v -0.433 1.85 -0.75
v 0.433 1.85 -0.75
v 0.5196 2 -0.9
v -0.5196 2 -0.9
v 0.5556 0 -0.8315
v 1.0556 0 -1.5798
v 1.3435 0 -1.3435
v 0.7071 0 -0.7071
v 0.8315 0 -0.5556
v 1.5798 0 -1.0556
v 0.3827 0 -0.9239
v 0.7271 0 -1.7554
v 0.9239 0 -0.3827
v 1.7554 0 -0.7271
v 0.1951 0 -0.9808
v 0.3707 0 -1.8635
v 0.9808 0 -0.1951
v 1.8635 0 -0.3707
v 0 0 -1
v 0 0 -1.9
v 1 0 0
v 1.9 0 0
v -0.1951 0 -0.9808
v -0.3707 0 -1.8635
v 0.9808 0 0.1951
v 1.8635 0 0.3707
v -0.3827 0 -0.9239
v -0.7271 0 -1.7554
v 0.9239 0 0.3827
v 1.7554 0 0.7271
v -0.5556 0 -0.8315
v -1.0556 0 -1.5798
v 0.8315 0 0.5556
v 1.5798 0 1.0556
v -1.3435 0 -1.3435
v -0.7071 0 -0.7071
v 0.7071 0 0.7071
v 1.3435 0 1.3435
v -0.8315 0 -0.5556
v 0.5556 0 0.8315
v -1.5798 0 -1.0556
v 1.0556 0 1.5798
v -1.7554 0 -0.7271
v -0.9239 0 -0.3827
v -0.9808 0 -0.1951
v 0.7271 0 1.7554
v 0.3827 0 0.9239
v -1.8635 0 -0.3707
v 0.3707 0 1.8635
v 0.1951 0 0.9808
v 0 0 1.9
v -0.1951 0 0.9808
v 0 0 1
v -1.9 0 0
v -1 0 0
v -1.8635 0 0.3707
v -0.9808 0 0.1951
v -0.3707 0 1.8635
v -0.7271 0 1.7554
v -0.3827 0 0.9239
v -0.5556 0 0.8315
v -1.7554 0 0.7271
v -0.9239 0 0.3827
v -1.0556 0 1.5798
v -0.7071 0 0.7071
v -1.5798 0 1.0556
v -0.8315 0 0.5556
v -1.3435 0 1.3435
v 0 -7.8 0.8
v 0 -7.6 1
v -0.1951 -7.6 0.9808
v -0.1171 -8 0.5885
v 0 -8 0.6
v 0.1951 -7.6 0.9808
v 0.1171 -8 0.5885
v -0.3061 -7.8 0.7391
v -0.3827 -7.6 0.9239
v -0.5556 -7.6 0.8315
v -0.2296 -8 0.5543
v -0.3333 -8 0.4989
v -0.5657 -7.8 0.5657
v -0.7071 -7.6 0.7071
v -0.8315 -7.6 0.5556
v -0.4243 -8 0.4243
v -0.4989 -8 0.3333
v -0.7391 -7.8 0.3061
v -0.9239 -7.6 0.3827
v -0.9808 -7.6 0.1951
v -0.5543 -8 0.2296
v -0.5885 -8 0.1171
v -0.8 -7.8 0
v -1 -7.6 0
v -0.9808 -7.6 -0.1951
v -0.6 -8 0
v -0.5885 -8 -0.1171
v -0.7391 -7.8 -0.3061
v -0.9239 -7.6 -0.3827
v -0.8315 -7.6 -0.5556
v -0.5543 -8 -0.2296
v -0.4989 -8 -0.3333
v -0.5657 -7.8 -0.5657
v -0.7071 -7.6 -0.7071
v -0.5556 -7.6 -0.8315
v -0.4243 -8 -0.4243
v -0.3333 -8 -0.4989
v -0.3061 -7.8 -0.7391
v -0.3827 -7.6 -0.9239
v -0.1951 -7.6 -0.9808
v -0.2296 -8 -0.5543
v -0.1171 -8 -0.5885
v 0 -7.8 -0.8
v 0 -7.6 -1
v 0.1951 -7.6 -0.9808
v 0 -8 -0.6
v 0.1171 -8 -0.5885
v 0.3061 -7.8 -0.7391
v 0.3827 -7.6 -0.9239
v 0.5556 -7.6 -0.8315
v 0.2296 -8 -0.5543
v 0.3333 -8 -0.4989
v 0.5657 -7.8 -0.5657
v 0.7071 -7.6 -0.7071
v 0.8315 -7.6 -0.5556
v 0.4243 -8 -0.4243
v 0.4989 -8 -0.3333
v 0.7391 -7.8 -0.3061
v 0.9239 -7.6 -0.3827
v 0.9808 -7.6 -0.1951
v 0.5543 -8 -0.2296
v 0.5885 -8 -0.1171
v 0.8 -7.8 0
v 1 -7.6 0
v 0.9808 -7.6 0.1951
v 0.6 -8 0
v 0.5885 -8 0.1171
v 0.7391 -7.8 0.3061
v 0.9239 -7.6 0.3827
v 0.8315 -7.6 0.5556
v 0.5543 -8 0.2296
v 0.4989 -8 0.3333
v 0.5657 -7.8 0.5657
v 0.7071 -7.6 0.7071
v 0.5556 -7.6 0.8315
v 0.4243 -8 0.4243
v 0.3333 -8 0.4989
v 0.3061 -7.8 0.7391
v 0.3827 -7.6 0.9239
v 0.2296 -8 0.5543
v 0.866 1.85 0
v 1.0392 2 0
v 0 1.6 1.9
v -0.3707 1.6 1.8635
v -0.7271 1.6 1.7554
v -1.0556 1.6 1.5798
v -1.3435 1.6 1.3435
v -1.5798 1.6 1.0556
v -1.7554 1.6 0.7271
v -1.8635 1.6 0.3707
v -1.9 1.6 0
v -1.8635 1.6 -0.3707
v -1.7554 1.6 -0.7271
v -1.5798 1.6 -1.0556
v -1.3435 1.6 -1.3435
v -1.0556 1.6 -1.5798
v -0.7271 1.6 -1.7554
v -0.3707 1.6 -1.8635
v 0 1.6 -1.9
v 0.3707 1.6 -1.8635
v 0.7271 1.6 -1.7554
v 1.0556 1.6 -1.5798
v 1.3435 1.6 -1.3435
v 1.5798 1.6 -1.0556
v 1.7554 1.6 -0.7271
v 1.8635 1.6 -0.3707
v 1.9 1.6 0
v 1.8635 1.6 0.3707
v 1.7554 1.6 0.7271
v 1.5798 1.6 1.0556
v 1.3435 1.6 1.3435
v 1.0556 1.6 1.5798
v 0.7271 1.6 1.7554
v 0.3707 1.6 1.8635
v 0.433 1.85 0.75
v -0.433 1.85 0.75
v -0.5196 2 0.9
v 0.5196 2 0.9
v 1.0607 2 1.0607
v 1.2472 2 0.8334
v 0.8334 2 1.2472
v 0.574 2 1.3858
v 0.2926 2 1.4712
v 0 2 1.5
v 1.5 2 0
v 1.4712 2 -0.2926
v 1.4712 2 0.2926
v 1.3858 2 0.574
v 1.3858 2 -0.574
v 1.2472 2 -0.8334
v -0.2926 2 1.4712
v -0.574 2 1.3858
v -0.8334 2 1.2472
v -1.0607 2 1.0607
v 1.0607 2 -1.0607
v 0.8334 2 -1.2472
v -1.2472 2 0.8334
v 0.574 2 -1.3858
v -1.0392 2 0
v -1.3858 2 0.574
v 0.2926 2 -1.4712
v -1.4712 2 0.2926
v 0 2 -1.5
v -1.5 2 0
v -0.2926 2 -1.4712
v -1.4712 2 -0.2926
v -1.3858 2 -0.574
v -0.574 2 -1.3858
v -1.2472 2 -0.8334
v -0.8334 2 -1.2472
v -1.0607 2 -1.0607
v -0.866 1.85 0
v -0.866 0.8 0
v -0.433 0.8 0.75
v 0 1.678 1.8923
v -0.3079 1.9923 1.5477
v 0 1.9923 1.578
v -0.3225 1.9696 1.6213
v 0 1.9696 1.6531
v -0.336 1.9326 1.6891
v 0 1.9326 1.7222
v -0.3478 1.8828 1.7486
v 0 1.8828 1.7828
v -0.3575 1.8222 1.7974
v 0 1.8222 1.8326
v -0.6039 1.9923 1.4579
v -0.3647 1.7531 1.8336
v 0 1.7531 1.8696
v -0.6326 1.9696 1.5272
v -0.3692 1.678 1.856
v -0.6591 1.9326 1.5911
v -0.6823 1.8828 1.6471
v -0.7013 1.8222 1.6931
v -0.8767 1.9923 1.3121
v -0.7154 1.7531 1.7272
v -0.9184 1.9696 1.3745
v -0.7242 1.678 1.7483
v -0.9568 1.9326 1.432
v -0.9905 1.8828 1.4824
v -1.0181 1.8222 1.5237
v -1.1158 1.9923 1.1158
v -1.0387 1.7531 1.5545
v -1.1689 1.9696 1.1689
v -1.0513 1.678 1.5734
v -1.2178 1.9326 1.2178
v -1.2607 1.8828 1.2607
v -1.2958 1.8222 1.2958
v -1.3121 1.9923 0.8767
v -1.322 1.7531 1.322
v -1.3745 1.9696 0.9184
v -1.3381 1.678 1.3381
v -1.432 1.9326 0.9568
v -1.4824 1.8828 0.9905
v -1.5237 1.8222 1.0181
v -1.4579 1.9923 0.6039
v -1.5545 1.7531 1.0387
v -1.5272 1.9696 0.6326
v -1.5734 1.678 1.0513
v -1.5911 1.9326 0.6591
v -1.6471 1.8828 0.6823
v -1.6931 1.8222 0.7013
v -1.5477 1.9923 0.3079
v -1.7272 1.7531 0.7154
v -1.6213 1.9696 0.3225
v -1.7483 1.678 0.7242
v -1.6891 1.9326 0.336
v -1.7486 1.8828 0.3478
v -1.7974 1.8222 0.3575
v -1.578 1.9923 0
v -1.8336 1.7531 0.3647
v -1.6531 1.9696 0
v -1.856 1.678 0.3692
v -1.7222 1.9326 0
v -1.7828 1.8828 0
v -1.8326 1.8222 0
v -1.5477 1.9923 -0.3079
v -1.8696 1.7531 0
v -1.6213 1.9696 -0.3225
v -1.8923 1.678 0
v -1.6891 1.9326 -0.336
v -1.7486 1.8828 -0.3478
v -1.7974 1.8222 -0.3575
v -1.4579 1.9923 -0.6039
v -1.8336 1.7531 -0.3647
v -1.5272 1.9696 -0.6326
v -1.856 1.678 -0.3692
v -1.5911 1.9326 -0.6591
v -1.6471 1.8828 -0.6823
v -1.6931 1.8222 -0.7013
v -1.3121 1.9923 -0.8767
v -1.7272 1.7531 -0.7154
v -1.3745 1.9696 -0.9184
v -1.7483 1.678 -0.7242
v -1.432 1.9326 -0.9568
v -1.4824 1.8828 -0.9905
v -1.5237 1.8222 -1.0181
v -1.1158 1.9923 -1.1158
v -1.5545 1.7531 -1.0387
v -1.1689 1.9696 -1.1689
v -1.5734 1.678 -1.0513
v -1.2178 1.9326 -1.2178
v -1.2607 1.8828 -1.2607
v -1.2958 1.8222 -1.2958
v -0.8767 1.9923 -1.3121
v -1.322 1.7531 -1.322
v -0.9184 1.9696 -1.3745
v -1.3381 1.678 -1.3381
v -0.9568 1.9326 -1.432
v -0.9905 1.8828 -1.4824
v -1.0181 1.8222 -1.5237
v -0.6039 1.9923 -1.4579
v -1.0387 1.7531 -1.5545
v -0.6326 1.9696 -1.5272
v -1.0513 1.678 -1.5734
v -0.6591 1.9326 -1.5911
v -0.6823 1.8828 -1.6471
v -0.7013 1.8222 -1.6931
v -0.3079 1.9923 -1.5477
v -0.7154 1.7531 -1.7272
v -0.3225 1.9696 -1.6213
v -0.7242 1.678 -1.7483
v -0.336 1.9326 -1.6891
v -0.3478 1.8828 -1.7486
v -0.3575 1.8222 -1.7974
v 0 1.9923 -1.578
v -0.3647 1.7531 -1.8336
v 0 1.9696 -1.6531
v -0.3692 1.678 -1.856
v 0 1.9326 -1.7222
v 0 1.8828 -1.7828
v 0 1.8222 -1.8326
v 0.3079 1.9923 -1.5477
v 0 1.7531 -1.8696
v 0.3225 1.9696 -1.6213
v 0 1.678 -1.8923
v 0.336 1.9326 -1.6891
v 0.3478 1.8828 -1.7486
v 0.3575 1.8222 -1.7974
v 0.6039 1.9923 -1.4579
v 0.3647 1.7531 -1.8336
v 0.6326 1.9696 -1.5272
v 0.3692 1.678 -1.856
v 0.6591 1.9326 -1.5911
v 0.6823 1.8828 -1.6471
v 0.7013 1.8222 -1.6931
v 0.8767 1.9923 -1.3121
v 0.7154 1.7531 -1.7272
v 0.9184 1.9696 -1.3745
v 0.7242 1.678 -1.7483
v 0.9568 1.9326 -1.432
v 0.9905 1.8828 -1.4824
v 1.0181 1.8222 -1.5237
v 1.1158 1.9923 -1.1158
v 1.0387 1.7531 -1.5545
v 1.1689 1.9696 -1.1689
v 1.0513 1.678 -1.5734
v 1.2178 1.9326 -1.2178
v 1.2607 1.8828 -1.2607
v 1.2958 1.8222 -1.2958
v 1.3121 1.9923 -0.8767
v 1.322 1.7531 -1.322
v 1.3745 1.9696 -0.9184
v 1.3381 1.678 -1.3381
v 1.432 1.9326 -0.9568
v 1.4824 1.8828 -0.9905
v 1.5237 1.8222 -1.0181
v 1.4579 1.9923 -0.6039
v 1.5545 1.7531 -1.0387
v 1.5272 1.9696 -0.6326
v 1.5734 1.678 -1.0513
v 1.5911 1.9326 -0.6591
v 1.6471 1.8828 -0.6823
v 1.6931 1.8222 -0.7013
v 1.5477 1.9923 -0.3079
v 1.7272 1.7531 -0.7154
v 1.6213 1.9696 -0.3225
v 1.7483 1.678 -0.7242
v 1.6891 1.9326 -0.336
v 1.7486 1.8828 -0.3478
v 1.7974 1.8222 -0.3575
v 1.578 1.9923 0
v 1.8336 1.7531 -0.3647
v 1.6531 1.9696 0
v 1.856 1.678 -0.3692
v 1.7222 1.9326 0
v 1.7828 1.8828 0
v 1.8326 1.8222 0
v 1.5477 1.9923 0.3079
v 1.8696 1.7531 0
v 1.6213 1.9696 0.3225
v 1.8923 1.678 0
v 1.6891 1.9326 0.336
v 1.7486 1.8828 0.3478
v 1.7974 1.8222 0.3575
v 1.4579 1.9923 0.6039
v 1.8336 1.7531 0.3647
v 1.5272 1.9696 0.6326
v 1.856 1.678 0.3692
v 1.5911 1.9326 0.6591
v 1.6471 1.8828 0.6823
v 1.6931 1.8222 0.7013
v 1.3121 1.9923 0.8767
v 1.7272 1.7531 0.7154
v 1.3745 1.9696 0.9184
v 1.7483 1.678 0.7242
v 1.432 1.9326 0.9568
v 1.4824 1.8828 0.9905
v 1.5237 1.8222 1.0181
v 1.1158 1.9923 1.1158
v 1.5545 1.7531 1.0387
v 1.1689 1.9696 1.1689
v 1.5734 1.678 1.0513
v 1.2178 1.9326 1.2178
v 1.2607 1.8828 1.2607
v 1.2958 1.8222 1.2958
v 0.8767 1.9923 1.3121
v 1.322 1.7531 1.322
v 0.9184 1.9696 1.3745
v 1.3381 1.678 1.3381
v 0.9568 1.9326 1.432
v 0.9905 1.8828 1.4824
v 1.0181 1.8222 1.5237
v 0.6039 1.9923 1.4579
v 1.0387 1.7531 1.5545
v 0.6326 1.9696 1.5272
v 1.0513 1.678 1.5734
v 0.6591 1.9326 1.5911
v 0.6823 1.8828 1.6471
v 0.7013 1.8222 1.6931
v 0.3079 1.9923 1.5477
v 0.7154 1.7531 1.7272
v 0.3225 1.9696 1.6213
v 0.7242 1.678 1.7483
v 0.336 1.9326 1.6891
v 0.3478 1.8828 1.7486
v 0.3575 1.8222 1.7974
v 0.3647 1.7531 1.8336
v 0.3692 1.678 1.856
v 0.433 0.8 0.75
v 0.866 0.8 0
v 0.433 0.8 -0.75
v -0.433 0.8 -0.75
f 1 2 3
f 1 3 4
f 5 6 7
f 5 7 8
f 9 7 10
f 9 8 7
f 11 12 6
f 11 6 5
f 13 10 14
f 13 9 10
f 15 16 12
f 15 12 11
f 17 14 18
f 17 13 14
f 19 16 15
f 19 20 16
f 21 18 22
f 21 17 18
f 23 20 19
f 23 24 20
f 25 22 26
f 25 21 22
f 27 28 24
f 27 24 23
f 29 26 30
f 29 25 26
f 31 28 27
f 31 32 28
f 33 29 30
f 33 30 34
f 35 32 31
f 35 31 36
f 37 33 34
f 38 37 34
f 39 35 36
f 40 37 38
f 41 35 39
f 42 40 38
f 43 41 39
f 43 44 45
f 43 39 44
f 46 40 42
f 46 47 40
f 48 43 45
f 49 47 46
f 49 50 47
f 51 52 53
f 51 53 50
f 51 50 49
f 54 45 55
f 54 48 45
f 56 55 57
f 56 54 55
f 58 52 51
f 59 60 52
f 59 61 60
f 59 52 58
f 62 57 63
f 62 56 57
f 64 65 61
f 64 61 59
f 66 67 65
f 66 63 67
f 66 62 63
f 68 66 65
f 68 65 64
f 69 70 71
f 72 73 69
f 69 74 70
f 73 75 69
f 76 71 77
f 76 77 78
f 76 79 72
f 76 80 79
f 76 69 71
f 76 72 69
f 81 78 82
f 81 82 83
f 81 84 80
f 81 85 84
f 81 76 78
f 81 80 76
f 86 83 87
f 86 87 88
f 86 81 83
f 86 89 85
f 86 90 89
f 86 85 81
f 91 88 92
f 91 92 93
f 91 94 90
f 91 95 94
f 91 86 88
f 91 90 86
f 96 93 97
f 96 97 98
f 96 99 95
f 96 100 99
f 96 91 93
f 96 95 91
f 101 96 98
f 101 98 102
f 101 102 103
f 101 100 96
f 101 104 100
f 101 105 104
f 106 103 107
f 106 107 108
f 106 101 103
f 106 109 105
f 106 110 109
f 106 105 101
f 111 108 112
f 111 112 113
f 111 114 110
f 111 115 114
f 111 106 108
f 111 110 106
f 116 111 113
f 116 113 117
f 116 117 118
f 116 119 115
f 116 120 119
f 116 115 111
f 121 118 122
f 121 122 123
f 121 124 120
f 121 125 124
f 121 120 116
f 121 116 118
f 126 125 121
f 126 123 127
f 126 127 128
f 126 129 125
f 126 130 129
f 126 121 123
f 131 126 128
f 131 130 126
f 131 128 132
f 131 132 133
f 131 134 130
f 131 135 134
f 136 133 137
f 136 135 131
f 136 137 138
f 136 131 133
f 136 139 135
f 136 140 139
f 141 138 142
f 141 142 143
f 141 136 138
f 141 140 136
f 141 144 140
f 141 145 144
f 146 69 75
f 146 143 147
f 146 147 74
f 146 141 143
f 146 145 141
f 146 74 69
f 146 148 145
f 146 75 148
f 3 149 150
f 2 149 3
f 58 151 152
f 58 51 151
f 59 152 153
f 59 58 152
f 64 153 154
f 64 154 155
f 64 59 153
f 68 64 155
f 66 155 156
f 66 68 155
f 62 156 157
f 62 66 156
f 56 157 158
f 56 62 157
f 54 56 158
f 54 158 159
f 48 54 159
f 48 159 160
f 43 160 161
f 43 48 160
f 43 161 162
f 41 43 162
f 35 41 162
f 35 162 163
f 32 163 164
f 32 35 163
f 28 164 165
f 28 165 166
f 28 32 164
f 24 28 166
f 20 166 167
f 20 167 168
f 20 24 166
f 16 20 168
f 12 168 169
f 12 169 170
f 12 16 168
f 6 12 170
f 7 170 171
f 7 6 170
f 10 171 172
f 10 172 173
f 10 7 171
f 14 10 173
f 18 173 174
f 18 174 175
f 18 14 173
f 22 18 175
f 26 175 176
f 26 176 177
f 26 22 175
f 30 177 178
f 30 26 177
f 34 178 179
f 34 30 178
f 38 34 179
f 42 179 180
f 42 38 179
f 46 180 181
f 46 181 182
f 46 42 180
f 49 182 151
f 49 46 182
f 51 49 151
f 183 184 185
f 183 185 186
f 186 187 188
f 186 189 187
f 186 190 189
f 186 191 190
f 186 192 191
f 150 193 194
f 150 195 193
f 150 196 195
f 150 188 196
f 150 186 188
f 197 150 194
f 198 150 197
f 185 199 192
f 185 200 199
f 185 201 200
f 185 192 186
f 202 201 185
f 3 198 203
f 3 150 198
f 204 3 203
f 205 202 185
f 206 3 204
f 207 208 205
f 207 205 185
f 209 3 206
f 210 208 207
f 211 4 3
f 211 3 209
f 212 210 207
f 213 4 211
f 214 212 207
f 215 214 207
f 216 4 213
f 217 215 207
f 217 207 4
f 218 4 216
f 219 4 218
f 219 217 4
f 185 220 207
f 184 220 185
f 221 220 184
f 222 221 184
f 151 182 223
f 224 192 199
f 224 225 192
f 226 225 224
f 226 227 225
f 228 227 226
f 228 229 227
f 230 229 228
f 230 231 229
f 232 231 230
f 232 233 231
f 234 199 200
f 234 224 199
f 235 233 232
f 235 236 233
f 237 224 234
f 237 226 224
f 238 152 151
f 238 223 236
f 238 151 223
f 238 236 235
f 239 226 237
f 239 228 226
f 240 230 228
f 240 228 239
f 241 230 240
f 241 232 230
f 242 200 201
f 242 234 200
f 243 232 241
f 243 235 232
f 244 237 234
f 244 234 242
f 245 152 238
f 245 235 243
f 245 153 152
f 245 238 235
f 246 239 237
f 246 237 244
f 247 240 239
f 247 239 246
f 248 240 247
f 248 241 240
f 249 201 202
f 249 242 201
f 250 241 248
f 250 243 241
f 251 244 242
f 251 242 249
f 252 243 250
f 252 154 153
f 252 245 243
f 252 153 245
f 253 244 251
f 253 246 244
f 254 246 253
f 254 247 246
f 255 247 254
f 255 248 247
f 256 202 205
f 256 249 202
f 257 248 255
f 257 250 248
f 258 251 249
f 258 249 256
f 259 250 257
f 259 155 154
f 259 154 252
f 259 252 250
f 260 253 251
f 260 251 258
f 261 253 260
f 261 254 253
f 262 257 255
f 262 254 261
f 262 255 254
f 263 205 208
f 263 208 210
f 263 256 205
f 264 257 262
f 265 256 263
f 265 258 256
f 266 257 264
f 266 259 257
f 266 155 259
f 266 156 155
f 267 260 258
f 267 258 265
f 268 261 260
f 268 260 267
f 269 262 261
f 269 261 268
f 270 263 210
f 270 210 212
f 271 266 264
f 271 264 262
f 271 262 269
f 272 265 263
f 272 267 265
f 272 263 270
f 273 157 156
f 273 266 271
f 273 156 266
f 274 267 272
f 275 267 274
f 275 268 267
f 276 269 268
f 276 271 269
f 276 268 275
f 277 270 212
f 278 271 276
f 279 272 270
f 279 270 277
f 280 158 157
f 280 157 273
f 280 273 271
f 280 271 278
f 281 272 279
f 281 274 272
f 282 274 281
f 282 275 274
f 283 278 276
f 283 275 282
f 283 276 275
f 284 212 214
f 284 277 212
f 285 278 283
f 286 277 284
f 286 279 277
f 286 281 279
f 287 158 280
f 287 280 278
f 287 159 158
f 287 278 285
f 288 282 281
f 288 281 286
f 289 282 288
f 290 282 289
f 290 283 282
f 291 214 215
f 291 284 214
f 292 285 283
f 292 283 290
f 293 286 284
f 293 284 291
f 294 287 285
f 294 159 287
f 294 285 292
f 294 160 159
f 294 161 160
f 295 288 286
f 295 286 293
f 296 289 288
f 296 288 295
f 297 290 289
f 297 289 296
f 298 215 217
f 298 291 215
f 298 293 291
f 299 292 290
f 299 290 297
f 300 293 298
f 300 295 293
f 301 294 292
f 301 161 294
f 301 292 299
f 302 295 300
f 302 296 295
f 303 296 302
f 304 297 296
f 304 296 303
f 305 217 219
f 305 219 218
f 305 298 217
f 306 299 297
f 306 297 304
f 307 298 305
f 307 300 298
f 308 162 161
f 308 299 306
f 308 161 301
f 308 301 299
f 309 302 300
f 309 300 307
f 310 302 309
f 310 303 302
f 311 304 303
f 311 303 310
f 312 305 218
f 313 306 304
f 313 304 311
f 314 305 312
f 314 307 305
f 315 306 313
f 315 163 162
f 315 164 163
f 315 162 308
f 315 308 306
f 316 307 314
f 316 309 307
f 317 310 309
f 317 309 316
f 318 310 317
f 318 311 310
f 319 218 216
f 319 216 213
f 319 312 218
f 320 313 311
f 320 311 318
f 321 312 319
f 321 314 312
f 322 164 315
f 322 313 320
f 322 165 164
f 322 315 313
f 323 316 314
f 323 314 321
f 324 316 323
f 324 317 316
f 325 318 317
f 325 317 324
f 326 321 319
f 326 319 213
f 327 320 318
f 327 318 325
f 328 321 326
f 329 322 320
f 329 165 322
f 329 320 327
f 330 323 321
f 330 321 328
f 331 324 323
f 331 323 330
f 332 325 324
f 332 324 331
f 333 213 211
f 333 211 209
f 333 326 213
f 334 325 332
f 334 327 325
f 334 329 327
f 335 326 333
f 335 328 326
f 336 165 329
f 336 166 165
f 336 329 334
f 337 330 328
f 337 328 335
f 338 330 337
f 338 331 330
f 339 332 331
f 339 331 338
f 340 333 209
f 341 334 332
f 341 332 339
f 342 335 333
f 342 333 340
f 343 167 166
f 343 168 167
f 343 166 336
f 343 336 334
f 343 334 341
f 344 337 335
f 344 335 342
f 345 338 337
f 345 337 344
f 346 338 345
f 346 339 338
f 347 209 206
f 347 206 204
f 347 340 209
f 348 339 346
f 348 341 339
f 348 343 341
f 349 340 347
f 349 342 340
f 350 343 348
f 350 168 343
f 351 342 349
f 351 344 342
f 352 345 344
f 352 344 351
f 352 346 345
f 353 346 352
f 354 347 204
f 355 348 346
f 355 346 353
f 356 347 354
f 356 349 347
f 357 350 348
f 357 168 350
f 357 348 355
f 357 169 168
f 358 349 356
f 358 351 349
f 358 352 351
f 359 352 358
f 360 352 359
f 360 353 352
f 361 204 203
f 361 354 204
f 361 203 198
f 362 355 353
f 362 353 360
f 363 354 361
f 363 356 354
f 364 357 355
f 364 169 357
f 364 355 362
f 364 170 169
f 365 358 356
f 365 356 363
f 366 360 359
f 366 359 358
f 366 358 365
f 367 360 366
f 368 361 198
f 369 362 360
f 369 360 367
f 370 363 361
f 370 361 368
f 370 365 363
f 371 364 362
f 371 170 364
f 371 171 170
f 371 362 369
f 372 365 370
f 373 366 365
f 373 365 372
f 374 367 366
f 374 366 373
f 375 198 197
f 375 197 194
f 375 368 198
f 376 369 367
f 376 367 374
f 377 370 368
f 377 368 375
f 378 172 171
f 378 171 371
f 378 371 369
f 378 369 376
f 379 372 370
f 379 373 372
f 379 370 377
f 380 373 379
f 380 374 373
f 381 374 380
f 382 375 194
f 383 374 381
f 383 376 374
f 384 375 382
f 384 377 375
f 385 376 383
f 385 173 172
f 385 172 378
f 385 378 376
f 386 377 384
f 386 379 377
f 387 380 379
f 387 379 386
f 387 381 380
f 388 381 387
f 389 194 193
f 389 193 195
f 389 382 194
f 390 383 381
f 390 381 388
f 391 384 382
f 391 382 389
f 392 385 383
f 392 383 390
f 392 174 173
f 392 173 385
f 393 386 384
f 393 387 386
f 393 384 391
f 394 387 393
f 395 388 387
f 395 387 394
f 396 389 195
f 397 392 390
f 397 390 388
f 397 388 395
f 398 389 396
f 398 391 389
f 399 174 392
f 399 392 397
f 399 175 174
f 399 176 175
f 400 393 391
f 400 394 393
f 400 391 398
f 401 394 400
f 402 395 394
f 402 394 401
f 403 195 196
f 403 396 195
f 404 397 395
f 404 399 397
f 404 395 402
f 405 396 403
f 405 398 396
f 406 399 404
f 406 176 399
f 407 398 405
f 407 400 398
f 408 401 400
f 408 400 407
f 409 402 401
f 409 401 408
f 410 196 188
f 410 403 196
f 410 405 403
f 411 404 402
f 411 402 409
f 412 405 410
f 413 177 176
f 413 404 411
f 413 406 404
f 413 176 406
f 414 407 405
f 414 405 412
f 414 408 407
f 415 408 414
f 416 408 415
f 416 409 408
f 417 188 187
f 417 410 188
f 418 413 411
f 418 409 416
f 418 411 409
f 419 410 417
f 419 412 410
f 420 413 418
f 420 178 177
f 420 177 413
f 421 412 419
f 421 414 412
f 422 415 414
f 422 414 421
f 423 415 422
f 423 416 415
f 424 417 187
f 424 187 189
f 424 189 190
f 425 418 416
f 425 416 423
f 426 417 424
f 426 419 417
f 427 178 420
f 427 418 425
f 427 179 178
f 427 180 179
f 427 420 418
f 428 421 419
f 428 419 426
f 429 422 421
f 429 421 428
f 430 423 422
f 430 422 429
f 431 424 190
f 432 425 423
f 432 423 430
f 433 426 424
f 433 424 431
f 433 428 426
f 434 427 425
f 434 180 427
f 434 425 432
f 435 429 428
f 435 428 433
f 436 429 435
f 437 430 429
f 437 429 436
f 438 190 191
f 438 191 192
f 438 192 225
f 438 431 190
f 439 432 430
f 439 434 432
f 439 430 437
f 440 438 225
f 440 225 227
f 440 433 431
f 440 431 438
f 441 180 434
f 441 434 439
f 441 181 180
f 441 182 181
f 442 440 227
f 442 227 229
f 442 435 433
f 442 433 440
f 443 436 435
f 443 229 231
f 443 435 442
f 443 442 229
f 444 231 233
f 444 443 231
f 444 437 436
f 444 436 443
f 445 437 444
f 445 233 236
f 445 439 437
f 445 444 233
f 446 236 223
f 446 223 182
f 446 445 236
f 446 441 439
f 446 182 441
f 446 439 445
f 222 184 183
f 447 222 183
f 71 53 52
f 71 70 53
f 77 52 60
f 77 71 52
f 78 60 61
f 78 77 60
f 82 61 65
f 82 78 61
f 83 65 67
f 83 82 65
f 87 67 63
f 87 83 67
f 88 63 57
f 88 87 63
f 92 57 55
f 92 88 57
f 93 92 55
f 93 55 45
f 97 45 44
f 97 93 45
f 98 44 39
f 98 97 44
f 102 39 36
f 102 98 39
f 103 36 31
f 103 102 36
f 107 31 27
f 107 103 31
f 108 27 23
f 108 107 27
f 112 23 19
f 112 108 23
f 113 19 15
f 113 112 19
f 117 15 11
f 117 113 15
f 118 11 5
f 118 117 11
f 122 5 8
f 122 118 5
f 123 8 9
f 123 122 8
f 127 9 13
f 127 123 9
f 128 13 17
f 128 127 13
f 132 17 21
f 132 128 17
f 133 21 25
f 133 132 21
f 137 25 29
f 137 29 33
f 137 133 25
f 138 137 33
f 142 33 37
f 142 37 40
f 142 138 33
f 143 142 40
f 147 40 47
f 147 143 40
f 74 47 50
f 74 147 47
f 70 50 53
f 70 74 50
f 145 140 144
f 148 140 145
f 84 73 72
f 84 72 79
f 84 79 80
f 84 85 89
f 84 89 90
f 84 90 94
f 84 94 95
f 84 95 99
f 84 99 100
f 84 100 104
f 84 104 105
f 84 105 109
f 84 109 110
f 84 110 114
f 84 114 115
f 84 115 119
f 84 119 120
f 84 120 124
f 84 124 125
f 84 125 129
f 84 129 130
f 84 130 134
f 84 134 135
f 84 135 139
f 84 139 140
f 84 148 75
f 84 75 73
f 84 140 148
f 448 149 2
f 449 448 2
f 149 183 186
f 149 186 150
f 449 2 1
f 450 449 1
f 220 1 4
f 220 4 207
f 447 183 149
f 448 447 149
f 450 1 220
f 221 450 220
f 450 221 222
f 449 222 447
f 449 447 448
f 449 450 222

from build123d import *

# Parameters (mm, degrees)
ENL_V_MAT_EXTRU_1_DEPTH = 1.2
CHANFREIN1_SIZE         = 0.15


with BuildPart() as part:
    # Esquisse1 → Révolution1 (revolve)
    with BuildSketch(Plane.XY, mode=Mode.PRIVATE) as r_volution1_sk:
        with BuildLine():
            Line((1, -7.6), (0.6, -8))
            Line((0.6, -8), (0, -8))
            Line((0, -8), (0, 2))
            Line((0, 2), (1.5, 2))
            ThreePointArc((1.5, 2), (1.782842712, 1.882842712), (1.9, 1.6))
            Line((1.9, 1.6), (1.9, 0))
            Line((1.9, 0), (1, 0))
            Line((1, 0), (1, -7.6))
        make_face()
    revolve(r_volution1_sk.sketch.rotate(Axis((0, 6.972972973, 0), (0, -1, 0)), 90), axis=Axis((0, 6.972972973, 0), (0, -1, 0)))

    # Esquisse2 → Enlèv. mat.-Extru.1 (cut)
    with BuildSketch(Plane(origin=(0, 2, 0), x_dir=(1, 0, 0), z_dir=(0, 1, 0))):
        Polygon((-0.866025404, 0), (-0.433012702, -0.75), (0.433012702, -0.75), (0.866025404, 0), (0.433012702, 0.75), (-0.433012702, 0.75), align=None)
    extrude(amount=-ENL_V_MAT_EXTRU_1_DEPTH, mode=Mode.SUBTRACT)

    # Chanfrein1
    chanfrein1_edges = [part.edges().sort_by_distance(p)[0] for p in [
        (-0.649519053, 2, -0.375),
        (-0.649519053, 2, 0.375),
        (0, 2, 0.75),
        (0.649519053, 2, 0.375),
        (0.649519053, 2, -0.375),
        (0, 2, -0.75),
    ]]
    chamfer(chanfrein1_edges, length=CHANFREIN1_SIZE)


solid = part.part
